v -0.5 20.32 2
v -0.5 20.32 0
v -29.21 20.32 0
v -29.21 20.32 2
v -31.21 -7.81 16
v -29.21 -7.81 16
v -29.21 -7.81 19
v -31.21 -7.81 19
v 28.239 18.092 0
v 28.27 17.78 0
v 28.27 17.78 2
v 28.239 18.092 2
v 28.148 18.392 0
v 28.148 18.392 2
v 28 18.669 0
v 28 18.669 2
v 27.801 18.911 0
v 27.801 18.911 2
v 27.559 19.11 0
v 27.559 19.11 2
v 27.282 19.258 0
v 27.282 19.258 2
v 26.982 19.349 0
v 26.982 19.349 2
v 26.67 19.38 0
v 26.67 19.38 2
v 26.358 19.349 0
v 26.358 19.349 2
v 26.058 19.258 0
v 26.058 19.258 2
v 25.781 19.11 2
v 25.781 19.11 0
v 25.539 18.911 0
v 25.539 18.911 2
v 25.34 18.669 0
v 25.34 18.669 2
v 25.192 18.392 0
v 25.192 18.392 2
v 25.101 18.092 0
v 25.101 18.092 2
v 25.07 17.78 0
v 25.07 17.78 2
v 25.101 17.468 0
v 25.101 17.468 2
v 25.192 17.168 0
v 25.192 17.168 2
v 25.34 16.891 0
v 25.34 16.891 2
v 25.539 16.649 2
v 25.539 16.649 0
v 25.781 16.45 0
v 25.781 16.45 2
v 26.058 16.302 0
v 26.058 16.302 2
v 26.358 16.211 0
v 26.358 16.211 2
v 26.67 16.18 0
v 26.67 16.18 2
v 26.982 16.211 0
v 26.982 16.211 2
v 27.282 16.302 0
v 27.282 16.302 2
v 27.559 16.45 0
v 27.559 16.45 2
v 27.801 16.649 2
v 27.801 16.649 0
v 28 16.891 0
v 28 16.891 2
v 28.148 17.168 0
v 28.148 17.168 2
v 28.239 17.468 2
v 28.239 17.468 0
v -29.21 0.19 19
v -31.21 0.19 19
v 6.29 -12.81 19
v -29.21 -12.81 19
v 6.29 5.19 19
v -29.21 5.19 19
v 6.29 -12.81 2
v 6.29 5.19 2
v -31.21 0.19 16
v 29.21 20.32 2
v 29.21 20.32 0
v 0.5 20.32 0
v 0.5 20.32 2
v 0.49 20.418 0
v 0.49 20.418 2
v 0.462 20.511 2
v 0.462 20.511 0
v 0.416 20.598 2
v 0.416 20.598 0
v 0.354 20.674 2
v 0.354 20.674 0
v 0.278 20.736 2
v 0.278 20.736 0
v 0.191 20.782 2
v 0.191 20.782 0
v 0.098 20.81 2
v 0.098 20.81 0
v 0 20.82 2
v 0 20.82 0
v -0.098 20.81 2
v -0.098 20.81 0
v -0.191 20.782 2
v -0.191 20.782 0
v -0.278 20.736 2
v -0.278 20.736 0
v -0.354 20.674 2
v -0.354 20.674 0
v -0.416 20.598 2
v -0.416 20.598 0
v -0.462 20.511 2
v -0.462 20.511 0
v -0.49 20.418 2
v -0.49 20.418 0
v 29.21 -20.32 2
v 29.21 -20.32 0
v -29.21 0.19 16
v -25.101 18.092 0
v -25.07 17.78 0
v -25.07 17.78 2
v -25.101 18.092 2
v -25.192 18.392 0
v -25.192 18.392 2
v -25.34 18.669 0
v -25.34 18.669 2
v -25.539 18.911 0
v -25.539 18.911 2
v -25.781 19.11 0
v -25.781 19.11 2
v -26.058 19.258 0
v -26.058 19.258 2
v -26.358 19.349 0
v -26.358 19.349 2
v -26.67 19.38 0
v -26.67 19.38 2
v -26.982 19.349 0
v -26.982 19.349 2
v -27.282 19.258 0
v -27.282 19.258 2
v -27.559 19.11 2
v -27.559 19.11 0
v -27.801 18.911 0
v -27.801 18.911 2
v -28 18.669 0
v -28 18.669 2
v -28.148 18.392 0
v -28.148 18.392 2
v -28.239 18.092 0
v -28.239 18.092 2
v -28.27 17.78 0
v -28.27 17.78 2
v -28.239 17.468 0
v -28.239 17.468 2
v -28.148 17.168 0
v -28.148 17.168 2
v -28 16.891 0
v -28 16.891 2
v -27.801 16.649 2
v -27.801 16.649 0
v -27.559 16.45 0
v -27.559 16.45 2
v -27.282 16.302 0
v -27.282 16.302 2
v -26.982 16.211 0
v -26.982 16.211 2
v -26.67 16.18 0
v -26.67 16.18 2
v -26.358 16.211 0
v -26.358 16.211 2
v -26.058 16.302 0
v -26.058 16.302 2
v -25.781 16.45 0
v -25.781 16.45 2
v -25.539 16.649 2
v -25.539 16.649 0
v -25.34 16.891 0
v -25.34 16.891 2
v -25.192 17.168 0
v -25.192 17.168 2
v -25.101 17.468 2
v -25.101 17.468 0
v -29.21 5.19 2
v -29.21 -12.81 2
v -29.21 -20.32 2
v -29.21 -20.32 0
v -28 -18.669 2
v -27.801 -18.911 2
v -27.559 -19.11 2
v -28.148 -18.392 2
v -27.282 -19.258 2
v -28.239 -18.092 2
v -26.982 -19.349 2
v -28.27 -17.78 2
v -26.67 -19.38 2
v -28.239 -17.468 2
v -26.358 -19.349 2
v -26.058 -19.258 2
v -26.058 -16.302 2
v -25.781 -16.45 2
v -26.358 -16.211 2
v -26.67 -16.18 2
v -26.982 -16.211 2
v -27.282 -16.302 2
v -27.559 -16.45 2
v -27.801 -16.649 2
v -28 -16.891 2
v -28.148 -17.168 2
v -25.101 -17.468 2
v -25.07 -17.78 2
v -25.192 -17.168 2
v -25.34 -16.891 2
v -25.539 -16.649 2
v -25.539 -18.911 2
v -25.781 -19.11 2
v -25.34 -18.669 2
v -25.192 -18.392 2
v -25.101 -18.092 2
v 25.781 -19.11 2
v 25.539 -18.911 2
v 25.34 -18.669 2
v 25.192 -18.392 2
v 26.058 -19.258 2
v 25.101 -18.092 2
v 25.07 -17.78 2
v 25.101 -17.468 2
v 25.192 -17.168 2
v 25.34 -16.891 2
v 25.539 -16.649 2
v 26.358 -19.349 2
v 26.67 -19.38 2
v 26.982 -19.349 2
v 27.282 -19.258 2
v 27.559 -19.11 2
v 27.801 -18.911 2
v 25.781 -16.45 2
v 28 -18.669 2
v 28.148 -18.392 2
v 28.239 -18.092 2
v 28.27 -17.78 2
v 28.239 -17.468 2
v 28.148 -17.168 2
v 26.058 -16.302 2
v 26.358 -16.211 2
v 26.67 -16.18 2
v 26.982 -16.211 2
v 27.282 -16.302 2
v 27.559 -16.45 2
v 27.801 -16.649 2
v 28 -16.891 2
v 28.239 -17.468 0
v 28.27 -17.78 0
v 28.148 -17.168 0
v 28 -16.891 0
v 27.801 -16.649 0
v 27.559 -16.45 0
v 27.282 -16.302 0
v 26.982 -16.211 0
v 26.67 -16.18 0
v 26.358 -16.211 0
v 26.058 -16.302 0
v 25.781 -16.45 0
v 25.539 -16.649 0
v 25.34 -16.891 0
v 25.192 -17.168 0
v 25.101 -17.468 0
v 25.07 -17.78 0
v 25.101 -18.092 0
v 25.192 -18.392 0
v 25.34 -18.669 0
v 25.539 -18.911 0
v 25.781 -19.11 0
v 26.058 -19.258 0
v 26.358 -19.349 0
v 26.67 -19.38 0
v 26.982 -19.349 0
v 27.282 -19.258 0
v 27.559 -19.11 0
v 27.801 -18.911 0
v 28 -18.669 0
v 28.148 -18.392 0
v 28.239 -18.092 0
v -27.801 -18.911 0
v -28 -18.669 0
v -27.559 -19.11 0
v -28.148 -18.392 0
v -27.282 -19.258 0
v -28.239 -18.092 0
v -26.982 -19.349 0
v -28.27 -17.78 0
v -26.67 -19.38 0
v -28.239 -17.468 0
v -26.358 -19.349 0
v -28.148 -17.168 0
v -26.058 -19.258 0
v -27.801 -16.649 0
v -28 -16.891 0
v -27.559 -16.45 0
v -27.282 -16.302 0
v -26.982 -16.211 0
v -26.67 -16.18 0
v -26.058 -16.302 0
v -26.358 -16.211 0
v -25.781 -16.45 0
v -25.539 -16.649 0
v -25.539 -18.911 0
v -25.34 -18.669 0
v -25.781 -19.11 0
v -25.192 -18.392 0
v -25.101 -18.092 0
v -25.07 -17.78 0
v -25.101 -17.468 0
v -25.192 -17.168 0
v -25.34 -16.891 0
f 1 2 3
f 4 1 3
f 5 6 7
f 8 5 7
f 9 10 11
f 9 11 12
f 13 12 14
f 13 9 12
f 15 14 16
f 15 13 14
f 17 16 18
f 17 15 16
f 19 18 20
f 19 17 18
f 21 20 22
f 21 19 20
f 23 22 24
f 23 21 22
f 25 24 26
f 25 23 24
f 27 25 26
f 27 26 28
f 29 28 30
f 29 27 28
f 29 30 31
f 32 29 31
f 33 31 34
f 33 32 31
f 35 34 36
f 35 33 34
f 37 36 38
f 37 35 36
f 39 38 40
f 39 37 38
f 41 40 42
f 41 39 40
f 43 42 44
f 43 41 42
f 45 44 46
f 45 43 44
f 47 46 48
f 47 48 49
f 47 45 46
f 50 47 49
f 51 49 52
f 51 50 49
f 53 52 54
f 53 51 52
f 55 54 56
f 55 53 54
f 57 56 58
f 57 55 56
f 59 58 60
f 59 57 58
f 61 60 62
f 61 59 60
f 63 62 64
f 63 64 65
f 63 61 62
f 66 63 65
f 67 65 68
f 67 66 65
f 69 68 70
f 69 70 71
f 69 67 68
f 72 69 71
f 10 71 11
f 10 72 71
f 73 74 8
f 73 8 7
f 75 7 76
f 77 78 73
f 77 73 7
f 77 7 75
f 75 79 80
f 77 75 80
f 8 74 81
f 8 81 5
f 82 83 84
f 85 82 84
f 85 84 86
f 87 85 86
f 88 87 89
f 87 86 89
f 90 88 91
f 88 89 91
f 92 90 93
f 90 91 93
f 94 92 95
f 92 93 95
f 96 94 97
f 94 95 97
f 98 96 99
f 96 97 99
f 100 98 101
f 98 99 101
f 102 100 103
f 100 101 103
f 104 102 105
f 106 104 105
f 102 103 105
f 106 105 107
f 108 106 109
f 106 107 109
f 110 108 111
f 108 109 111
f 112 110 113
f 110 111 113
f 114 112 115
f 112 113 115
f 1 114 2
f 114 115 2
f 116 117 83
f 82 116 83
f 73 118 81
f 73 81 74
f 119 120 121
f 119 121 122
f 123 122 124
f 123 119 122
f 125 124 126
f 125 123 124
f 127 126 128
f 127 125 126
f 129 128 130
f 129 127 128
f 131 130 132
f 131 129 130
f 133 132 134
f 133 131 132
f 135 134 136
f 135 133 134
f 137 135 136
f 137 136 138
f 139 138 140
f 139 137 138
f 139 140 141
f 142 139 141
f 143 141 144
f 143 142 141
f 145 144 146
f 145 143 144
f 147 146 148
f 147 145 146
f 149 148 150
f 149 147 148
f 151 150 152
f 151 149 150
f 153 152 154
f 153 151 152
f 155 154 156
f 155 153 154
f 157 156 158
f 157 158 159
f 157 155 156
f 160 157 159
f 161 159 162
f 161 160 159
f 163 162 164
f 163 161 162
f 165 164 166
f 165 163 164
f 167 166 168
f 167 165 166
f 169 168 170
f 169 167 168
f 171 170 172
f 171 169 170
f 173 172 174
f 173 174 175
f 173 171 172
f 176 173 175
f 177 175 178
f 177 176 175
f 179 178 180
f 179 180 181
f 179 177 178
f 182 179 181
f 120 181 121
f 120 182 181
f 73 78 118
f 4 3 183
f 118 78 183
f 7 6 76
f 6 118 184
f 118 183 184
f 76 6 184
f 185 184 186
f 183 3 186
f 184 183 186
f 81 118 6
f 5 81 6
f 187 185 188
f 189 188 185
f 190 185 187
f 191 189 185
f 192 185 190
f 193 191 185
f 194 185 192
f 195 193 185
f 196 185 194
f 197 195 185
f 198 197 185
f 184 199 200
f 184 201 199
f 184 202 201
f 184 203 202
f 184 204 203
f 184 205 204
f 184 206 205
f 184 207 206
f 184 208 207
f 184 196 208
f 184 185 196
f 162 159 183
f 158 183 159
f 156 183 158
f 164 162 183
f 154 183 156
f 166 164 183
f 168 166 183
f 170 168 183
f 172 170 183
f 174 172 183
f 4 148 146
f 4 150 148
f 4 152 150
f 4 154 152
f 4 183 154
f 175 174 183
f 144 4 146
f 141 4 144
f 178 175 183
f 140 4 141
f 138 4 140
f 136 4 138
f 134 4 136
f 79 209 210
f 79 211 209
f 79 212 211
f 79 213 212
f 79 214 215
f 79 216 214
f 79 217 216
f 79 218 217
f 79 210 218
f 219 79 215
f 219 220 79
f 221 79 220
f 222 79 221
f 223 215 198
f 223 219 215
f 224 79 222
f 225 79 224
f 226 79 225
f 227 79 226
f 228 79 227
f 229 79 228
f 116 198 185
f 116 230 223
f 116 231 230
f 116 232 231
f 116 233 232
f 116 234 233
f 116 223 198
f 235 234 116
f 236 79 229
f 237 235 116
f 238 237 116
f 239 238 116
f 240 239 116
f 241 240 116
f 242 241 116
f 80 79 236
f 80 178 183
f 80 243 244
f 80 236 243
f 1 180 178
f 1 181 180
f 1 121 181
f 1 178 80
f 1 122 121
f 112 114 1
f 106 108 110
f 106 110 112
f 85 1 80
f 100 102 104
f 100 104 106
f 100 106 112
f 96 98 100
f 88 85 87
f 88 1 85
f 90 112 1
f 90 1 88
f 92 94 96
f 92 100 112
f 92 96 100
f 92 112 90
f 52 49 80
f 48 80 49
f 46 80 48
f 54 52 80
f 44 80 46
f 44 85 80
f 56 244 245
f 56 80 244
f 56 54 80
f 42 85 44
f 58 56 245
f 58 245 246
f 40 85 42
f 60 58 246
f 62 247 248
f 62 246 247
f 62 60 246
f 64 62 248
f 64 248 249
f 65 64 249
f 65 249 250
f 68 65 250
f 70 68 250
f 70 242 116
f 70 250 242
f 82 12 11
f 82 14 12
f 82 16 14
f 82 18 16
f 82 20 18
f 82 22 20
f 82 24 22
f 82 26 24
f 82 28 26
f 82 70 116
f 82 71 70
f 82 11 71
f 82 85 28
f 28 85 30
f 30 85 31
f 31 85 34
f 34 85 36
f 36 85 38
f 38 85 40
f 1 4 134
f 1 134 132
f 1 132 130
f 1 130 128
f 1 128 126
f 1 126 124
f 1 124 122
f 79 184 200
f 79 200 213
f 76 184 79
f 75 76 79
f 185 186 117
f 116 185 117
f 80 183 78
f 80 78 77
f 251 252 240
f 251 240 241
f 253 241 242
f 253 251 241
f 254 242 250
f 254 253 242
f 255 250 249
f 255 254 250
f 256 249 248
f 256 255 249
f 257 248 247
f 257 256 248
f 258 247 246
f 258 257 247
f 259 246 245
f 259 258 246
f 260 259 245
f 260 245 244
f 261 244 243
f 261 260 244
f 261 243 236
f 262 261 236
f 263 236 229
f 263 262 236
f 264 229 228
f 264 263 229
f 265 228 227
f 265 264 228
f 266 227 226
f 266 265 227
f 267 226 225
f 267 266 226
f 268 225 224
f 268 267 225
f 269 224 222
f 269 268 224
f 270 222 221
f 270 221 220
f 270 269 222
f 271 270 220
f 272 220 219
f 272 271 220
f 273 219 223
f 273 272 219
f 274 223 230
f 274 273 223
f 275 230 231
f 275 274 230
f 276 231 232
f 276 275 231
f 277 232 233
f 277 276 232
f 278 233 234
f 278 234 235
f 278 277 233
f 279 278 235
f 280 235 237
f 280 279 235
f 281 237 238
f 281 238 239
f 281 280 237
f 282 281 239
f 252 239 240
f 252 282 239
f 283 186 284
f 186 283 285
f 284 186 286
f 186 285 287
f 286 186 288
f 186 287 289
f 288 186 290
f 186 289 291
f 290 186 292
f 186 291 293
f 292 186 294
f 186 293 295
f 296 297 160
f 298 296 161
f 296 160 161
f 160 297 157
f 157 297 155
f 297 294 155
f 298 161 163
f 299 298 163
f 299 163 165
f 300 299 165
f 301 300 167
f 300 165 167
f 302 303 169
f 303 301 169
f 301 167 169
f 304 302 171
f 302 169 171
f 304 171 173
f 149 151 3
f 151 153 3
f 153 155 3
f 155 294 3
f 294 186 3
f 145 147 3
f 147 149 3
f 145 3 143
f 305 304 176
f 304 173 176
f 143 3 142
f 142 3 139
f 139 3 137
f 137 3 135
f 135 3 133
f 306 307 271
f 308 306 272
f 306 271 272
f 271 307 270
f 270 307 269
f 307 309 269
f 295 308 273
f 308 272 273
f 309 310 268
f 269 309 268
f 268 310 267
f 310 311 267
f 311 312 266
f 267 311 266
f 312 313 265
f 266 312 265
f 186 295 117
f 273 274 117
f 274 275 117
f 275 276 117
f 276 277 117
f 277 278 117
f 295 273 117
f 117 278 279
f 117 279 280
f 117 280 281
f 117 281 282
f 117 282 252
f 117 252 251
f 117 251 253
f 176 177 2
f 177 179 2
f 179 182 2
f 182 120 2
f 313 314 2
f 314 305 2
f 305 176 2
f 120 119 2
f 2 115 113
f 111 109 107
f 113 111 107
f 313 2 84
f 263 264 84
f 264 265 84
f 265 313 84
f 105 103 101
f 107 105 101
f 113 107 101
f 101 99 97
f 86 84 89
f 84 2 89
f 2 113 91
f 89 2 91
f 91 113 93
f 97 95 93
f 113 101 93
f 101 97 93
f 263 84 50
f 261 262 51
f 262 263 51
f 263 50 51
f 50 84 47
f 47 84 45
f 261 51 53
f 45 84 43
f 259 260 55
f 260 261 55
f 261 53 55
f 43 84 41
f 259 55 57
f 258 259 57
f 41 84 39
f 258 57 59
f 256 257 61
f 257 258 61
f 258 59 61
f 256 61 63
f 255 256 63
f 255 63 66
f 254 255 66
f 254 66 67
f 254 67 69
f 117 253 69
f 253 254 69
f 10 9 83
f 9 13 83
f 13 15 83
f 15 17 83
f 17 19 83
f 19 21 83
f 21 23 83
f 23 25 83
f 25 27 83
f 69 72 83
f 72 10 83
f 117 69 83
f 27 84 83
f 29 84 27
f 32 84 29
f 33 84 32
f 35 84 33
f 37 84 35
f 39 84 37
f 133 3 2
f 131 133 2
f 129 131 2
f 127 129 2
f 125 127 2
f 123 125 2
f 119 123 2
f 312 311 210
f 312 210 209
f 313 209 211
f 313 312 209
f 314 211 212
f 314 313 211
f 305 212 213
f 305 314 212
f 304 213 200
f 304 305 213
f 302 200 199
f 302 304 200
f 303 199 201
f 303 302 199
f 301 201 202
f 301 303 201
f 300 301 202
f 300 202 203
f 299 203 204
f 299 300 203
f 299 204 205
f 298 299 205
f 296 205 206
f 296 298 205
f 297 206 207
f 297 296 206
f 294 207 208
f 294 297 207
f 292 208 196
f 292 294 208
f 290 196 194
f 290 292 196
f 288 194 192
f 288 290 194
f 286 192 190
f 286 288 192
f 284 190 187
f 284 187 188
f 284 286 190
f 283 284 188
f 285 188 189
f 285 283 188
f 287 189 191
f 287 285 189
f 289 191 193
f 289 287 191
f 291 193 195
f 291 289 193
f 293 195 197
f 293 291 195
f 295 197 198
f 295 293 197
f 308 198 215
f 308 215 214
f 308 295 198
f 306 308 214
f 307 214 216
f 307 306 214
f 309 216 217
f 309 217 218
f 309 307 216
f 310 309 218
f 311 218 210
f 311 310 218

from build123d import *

# Parameters (mm, degrees)
F0_R     = 1.6
F1_DEPTH = 2
F3_W     = 35.5
F3_H     = 18
F4_DEPTH = 17
F6_W     = 8
F6_H     = 3
F7_DEPTH = 2


with BuildPart() as f1:
    # F0 (on Top) → F1 (new body)
    with BuildSketch(Plane.XY):
        with BuildLine():
            Line((-29.21, -20.32), (29.21, -20.32))
            Line((29.21, -20.32), (29.21, 20.32))
            Line((29.21, 20.32), (0.5, 20.32))
            ThreePointArc((0.5, 20.32), (0, 19.82), (-0.5, 20.32))
            Line((-0.5, 20.32), (-29.21, 20.32))
            Line((-29.21, 20.32), (-29.21, -20.32))
        make_face()
        with Locations((-26.67, -17.78)):
            Circle(F0_R, mode=Mode.SUBTRACT)
        with Locations((26.67, -17.78)):
            Circle(F0_R, mode=Mode.SUBTRACT)
        with Locations((-26.67, 17.78)):
            Circle(F0_R, mode=Mode.SUBTRACT)
        with Locations((26.67, 17.78)):
            Circle(F0_R, mode=Mode.SUBTRACT)
        with BuildLine():
            ThreePointArc((-0.5, 20.32), (0, 19.82), (0.5, 20.32))
            Line((0.5, 20.32), (-0.5, 20.32))
        make_face()
        with BuildLine():
            Line((-0.5, 20.32), (0.5, 20.32))
            ThreePointArc((0.5, 20.32), (0, 20.82), (-0.5, 20.32))
        make_face()
    extrude(amount=F1_DEPTH)

    # F3 (on offset) → F4 (join)
    with BuildSketch(Plane.XY.offset(2)):
        with Locations((-11.46, -3.81)):
            Rectangle(F3_W, F3_H)
    extrude(amount=F4_DEPTH)

    # F6 (on offset) → F7 (join)
    with BuildSketch(Plane(origin=(-29.21, 0, 0), x_dir=(0, -1, 0), z_dir=(-1, 0, 0))):
        with Locations((3.81, 17.5)):
            Rectangle(F6_W, F6_H)
    extrude(amount=F7_DEPTH)


solid = f1.part
